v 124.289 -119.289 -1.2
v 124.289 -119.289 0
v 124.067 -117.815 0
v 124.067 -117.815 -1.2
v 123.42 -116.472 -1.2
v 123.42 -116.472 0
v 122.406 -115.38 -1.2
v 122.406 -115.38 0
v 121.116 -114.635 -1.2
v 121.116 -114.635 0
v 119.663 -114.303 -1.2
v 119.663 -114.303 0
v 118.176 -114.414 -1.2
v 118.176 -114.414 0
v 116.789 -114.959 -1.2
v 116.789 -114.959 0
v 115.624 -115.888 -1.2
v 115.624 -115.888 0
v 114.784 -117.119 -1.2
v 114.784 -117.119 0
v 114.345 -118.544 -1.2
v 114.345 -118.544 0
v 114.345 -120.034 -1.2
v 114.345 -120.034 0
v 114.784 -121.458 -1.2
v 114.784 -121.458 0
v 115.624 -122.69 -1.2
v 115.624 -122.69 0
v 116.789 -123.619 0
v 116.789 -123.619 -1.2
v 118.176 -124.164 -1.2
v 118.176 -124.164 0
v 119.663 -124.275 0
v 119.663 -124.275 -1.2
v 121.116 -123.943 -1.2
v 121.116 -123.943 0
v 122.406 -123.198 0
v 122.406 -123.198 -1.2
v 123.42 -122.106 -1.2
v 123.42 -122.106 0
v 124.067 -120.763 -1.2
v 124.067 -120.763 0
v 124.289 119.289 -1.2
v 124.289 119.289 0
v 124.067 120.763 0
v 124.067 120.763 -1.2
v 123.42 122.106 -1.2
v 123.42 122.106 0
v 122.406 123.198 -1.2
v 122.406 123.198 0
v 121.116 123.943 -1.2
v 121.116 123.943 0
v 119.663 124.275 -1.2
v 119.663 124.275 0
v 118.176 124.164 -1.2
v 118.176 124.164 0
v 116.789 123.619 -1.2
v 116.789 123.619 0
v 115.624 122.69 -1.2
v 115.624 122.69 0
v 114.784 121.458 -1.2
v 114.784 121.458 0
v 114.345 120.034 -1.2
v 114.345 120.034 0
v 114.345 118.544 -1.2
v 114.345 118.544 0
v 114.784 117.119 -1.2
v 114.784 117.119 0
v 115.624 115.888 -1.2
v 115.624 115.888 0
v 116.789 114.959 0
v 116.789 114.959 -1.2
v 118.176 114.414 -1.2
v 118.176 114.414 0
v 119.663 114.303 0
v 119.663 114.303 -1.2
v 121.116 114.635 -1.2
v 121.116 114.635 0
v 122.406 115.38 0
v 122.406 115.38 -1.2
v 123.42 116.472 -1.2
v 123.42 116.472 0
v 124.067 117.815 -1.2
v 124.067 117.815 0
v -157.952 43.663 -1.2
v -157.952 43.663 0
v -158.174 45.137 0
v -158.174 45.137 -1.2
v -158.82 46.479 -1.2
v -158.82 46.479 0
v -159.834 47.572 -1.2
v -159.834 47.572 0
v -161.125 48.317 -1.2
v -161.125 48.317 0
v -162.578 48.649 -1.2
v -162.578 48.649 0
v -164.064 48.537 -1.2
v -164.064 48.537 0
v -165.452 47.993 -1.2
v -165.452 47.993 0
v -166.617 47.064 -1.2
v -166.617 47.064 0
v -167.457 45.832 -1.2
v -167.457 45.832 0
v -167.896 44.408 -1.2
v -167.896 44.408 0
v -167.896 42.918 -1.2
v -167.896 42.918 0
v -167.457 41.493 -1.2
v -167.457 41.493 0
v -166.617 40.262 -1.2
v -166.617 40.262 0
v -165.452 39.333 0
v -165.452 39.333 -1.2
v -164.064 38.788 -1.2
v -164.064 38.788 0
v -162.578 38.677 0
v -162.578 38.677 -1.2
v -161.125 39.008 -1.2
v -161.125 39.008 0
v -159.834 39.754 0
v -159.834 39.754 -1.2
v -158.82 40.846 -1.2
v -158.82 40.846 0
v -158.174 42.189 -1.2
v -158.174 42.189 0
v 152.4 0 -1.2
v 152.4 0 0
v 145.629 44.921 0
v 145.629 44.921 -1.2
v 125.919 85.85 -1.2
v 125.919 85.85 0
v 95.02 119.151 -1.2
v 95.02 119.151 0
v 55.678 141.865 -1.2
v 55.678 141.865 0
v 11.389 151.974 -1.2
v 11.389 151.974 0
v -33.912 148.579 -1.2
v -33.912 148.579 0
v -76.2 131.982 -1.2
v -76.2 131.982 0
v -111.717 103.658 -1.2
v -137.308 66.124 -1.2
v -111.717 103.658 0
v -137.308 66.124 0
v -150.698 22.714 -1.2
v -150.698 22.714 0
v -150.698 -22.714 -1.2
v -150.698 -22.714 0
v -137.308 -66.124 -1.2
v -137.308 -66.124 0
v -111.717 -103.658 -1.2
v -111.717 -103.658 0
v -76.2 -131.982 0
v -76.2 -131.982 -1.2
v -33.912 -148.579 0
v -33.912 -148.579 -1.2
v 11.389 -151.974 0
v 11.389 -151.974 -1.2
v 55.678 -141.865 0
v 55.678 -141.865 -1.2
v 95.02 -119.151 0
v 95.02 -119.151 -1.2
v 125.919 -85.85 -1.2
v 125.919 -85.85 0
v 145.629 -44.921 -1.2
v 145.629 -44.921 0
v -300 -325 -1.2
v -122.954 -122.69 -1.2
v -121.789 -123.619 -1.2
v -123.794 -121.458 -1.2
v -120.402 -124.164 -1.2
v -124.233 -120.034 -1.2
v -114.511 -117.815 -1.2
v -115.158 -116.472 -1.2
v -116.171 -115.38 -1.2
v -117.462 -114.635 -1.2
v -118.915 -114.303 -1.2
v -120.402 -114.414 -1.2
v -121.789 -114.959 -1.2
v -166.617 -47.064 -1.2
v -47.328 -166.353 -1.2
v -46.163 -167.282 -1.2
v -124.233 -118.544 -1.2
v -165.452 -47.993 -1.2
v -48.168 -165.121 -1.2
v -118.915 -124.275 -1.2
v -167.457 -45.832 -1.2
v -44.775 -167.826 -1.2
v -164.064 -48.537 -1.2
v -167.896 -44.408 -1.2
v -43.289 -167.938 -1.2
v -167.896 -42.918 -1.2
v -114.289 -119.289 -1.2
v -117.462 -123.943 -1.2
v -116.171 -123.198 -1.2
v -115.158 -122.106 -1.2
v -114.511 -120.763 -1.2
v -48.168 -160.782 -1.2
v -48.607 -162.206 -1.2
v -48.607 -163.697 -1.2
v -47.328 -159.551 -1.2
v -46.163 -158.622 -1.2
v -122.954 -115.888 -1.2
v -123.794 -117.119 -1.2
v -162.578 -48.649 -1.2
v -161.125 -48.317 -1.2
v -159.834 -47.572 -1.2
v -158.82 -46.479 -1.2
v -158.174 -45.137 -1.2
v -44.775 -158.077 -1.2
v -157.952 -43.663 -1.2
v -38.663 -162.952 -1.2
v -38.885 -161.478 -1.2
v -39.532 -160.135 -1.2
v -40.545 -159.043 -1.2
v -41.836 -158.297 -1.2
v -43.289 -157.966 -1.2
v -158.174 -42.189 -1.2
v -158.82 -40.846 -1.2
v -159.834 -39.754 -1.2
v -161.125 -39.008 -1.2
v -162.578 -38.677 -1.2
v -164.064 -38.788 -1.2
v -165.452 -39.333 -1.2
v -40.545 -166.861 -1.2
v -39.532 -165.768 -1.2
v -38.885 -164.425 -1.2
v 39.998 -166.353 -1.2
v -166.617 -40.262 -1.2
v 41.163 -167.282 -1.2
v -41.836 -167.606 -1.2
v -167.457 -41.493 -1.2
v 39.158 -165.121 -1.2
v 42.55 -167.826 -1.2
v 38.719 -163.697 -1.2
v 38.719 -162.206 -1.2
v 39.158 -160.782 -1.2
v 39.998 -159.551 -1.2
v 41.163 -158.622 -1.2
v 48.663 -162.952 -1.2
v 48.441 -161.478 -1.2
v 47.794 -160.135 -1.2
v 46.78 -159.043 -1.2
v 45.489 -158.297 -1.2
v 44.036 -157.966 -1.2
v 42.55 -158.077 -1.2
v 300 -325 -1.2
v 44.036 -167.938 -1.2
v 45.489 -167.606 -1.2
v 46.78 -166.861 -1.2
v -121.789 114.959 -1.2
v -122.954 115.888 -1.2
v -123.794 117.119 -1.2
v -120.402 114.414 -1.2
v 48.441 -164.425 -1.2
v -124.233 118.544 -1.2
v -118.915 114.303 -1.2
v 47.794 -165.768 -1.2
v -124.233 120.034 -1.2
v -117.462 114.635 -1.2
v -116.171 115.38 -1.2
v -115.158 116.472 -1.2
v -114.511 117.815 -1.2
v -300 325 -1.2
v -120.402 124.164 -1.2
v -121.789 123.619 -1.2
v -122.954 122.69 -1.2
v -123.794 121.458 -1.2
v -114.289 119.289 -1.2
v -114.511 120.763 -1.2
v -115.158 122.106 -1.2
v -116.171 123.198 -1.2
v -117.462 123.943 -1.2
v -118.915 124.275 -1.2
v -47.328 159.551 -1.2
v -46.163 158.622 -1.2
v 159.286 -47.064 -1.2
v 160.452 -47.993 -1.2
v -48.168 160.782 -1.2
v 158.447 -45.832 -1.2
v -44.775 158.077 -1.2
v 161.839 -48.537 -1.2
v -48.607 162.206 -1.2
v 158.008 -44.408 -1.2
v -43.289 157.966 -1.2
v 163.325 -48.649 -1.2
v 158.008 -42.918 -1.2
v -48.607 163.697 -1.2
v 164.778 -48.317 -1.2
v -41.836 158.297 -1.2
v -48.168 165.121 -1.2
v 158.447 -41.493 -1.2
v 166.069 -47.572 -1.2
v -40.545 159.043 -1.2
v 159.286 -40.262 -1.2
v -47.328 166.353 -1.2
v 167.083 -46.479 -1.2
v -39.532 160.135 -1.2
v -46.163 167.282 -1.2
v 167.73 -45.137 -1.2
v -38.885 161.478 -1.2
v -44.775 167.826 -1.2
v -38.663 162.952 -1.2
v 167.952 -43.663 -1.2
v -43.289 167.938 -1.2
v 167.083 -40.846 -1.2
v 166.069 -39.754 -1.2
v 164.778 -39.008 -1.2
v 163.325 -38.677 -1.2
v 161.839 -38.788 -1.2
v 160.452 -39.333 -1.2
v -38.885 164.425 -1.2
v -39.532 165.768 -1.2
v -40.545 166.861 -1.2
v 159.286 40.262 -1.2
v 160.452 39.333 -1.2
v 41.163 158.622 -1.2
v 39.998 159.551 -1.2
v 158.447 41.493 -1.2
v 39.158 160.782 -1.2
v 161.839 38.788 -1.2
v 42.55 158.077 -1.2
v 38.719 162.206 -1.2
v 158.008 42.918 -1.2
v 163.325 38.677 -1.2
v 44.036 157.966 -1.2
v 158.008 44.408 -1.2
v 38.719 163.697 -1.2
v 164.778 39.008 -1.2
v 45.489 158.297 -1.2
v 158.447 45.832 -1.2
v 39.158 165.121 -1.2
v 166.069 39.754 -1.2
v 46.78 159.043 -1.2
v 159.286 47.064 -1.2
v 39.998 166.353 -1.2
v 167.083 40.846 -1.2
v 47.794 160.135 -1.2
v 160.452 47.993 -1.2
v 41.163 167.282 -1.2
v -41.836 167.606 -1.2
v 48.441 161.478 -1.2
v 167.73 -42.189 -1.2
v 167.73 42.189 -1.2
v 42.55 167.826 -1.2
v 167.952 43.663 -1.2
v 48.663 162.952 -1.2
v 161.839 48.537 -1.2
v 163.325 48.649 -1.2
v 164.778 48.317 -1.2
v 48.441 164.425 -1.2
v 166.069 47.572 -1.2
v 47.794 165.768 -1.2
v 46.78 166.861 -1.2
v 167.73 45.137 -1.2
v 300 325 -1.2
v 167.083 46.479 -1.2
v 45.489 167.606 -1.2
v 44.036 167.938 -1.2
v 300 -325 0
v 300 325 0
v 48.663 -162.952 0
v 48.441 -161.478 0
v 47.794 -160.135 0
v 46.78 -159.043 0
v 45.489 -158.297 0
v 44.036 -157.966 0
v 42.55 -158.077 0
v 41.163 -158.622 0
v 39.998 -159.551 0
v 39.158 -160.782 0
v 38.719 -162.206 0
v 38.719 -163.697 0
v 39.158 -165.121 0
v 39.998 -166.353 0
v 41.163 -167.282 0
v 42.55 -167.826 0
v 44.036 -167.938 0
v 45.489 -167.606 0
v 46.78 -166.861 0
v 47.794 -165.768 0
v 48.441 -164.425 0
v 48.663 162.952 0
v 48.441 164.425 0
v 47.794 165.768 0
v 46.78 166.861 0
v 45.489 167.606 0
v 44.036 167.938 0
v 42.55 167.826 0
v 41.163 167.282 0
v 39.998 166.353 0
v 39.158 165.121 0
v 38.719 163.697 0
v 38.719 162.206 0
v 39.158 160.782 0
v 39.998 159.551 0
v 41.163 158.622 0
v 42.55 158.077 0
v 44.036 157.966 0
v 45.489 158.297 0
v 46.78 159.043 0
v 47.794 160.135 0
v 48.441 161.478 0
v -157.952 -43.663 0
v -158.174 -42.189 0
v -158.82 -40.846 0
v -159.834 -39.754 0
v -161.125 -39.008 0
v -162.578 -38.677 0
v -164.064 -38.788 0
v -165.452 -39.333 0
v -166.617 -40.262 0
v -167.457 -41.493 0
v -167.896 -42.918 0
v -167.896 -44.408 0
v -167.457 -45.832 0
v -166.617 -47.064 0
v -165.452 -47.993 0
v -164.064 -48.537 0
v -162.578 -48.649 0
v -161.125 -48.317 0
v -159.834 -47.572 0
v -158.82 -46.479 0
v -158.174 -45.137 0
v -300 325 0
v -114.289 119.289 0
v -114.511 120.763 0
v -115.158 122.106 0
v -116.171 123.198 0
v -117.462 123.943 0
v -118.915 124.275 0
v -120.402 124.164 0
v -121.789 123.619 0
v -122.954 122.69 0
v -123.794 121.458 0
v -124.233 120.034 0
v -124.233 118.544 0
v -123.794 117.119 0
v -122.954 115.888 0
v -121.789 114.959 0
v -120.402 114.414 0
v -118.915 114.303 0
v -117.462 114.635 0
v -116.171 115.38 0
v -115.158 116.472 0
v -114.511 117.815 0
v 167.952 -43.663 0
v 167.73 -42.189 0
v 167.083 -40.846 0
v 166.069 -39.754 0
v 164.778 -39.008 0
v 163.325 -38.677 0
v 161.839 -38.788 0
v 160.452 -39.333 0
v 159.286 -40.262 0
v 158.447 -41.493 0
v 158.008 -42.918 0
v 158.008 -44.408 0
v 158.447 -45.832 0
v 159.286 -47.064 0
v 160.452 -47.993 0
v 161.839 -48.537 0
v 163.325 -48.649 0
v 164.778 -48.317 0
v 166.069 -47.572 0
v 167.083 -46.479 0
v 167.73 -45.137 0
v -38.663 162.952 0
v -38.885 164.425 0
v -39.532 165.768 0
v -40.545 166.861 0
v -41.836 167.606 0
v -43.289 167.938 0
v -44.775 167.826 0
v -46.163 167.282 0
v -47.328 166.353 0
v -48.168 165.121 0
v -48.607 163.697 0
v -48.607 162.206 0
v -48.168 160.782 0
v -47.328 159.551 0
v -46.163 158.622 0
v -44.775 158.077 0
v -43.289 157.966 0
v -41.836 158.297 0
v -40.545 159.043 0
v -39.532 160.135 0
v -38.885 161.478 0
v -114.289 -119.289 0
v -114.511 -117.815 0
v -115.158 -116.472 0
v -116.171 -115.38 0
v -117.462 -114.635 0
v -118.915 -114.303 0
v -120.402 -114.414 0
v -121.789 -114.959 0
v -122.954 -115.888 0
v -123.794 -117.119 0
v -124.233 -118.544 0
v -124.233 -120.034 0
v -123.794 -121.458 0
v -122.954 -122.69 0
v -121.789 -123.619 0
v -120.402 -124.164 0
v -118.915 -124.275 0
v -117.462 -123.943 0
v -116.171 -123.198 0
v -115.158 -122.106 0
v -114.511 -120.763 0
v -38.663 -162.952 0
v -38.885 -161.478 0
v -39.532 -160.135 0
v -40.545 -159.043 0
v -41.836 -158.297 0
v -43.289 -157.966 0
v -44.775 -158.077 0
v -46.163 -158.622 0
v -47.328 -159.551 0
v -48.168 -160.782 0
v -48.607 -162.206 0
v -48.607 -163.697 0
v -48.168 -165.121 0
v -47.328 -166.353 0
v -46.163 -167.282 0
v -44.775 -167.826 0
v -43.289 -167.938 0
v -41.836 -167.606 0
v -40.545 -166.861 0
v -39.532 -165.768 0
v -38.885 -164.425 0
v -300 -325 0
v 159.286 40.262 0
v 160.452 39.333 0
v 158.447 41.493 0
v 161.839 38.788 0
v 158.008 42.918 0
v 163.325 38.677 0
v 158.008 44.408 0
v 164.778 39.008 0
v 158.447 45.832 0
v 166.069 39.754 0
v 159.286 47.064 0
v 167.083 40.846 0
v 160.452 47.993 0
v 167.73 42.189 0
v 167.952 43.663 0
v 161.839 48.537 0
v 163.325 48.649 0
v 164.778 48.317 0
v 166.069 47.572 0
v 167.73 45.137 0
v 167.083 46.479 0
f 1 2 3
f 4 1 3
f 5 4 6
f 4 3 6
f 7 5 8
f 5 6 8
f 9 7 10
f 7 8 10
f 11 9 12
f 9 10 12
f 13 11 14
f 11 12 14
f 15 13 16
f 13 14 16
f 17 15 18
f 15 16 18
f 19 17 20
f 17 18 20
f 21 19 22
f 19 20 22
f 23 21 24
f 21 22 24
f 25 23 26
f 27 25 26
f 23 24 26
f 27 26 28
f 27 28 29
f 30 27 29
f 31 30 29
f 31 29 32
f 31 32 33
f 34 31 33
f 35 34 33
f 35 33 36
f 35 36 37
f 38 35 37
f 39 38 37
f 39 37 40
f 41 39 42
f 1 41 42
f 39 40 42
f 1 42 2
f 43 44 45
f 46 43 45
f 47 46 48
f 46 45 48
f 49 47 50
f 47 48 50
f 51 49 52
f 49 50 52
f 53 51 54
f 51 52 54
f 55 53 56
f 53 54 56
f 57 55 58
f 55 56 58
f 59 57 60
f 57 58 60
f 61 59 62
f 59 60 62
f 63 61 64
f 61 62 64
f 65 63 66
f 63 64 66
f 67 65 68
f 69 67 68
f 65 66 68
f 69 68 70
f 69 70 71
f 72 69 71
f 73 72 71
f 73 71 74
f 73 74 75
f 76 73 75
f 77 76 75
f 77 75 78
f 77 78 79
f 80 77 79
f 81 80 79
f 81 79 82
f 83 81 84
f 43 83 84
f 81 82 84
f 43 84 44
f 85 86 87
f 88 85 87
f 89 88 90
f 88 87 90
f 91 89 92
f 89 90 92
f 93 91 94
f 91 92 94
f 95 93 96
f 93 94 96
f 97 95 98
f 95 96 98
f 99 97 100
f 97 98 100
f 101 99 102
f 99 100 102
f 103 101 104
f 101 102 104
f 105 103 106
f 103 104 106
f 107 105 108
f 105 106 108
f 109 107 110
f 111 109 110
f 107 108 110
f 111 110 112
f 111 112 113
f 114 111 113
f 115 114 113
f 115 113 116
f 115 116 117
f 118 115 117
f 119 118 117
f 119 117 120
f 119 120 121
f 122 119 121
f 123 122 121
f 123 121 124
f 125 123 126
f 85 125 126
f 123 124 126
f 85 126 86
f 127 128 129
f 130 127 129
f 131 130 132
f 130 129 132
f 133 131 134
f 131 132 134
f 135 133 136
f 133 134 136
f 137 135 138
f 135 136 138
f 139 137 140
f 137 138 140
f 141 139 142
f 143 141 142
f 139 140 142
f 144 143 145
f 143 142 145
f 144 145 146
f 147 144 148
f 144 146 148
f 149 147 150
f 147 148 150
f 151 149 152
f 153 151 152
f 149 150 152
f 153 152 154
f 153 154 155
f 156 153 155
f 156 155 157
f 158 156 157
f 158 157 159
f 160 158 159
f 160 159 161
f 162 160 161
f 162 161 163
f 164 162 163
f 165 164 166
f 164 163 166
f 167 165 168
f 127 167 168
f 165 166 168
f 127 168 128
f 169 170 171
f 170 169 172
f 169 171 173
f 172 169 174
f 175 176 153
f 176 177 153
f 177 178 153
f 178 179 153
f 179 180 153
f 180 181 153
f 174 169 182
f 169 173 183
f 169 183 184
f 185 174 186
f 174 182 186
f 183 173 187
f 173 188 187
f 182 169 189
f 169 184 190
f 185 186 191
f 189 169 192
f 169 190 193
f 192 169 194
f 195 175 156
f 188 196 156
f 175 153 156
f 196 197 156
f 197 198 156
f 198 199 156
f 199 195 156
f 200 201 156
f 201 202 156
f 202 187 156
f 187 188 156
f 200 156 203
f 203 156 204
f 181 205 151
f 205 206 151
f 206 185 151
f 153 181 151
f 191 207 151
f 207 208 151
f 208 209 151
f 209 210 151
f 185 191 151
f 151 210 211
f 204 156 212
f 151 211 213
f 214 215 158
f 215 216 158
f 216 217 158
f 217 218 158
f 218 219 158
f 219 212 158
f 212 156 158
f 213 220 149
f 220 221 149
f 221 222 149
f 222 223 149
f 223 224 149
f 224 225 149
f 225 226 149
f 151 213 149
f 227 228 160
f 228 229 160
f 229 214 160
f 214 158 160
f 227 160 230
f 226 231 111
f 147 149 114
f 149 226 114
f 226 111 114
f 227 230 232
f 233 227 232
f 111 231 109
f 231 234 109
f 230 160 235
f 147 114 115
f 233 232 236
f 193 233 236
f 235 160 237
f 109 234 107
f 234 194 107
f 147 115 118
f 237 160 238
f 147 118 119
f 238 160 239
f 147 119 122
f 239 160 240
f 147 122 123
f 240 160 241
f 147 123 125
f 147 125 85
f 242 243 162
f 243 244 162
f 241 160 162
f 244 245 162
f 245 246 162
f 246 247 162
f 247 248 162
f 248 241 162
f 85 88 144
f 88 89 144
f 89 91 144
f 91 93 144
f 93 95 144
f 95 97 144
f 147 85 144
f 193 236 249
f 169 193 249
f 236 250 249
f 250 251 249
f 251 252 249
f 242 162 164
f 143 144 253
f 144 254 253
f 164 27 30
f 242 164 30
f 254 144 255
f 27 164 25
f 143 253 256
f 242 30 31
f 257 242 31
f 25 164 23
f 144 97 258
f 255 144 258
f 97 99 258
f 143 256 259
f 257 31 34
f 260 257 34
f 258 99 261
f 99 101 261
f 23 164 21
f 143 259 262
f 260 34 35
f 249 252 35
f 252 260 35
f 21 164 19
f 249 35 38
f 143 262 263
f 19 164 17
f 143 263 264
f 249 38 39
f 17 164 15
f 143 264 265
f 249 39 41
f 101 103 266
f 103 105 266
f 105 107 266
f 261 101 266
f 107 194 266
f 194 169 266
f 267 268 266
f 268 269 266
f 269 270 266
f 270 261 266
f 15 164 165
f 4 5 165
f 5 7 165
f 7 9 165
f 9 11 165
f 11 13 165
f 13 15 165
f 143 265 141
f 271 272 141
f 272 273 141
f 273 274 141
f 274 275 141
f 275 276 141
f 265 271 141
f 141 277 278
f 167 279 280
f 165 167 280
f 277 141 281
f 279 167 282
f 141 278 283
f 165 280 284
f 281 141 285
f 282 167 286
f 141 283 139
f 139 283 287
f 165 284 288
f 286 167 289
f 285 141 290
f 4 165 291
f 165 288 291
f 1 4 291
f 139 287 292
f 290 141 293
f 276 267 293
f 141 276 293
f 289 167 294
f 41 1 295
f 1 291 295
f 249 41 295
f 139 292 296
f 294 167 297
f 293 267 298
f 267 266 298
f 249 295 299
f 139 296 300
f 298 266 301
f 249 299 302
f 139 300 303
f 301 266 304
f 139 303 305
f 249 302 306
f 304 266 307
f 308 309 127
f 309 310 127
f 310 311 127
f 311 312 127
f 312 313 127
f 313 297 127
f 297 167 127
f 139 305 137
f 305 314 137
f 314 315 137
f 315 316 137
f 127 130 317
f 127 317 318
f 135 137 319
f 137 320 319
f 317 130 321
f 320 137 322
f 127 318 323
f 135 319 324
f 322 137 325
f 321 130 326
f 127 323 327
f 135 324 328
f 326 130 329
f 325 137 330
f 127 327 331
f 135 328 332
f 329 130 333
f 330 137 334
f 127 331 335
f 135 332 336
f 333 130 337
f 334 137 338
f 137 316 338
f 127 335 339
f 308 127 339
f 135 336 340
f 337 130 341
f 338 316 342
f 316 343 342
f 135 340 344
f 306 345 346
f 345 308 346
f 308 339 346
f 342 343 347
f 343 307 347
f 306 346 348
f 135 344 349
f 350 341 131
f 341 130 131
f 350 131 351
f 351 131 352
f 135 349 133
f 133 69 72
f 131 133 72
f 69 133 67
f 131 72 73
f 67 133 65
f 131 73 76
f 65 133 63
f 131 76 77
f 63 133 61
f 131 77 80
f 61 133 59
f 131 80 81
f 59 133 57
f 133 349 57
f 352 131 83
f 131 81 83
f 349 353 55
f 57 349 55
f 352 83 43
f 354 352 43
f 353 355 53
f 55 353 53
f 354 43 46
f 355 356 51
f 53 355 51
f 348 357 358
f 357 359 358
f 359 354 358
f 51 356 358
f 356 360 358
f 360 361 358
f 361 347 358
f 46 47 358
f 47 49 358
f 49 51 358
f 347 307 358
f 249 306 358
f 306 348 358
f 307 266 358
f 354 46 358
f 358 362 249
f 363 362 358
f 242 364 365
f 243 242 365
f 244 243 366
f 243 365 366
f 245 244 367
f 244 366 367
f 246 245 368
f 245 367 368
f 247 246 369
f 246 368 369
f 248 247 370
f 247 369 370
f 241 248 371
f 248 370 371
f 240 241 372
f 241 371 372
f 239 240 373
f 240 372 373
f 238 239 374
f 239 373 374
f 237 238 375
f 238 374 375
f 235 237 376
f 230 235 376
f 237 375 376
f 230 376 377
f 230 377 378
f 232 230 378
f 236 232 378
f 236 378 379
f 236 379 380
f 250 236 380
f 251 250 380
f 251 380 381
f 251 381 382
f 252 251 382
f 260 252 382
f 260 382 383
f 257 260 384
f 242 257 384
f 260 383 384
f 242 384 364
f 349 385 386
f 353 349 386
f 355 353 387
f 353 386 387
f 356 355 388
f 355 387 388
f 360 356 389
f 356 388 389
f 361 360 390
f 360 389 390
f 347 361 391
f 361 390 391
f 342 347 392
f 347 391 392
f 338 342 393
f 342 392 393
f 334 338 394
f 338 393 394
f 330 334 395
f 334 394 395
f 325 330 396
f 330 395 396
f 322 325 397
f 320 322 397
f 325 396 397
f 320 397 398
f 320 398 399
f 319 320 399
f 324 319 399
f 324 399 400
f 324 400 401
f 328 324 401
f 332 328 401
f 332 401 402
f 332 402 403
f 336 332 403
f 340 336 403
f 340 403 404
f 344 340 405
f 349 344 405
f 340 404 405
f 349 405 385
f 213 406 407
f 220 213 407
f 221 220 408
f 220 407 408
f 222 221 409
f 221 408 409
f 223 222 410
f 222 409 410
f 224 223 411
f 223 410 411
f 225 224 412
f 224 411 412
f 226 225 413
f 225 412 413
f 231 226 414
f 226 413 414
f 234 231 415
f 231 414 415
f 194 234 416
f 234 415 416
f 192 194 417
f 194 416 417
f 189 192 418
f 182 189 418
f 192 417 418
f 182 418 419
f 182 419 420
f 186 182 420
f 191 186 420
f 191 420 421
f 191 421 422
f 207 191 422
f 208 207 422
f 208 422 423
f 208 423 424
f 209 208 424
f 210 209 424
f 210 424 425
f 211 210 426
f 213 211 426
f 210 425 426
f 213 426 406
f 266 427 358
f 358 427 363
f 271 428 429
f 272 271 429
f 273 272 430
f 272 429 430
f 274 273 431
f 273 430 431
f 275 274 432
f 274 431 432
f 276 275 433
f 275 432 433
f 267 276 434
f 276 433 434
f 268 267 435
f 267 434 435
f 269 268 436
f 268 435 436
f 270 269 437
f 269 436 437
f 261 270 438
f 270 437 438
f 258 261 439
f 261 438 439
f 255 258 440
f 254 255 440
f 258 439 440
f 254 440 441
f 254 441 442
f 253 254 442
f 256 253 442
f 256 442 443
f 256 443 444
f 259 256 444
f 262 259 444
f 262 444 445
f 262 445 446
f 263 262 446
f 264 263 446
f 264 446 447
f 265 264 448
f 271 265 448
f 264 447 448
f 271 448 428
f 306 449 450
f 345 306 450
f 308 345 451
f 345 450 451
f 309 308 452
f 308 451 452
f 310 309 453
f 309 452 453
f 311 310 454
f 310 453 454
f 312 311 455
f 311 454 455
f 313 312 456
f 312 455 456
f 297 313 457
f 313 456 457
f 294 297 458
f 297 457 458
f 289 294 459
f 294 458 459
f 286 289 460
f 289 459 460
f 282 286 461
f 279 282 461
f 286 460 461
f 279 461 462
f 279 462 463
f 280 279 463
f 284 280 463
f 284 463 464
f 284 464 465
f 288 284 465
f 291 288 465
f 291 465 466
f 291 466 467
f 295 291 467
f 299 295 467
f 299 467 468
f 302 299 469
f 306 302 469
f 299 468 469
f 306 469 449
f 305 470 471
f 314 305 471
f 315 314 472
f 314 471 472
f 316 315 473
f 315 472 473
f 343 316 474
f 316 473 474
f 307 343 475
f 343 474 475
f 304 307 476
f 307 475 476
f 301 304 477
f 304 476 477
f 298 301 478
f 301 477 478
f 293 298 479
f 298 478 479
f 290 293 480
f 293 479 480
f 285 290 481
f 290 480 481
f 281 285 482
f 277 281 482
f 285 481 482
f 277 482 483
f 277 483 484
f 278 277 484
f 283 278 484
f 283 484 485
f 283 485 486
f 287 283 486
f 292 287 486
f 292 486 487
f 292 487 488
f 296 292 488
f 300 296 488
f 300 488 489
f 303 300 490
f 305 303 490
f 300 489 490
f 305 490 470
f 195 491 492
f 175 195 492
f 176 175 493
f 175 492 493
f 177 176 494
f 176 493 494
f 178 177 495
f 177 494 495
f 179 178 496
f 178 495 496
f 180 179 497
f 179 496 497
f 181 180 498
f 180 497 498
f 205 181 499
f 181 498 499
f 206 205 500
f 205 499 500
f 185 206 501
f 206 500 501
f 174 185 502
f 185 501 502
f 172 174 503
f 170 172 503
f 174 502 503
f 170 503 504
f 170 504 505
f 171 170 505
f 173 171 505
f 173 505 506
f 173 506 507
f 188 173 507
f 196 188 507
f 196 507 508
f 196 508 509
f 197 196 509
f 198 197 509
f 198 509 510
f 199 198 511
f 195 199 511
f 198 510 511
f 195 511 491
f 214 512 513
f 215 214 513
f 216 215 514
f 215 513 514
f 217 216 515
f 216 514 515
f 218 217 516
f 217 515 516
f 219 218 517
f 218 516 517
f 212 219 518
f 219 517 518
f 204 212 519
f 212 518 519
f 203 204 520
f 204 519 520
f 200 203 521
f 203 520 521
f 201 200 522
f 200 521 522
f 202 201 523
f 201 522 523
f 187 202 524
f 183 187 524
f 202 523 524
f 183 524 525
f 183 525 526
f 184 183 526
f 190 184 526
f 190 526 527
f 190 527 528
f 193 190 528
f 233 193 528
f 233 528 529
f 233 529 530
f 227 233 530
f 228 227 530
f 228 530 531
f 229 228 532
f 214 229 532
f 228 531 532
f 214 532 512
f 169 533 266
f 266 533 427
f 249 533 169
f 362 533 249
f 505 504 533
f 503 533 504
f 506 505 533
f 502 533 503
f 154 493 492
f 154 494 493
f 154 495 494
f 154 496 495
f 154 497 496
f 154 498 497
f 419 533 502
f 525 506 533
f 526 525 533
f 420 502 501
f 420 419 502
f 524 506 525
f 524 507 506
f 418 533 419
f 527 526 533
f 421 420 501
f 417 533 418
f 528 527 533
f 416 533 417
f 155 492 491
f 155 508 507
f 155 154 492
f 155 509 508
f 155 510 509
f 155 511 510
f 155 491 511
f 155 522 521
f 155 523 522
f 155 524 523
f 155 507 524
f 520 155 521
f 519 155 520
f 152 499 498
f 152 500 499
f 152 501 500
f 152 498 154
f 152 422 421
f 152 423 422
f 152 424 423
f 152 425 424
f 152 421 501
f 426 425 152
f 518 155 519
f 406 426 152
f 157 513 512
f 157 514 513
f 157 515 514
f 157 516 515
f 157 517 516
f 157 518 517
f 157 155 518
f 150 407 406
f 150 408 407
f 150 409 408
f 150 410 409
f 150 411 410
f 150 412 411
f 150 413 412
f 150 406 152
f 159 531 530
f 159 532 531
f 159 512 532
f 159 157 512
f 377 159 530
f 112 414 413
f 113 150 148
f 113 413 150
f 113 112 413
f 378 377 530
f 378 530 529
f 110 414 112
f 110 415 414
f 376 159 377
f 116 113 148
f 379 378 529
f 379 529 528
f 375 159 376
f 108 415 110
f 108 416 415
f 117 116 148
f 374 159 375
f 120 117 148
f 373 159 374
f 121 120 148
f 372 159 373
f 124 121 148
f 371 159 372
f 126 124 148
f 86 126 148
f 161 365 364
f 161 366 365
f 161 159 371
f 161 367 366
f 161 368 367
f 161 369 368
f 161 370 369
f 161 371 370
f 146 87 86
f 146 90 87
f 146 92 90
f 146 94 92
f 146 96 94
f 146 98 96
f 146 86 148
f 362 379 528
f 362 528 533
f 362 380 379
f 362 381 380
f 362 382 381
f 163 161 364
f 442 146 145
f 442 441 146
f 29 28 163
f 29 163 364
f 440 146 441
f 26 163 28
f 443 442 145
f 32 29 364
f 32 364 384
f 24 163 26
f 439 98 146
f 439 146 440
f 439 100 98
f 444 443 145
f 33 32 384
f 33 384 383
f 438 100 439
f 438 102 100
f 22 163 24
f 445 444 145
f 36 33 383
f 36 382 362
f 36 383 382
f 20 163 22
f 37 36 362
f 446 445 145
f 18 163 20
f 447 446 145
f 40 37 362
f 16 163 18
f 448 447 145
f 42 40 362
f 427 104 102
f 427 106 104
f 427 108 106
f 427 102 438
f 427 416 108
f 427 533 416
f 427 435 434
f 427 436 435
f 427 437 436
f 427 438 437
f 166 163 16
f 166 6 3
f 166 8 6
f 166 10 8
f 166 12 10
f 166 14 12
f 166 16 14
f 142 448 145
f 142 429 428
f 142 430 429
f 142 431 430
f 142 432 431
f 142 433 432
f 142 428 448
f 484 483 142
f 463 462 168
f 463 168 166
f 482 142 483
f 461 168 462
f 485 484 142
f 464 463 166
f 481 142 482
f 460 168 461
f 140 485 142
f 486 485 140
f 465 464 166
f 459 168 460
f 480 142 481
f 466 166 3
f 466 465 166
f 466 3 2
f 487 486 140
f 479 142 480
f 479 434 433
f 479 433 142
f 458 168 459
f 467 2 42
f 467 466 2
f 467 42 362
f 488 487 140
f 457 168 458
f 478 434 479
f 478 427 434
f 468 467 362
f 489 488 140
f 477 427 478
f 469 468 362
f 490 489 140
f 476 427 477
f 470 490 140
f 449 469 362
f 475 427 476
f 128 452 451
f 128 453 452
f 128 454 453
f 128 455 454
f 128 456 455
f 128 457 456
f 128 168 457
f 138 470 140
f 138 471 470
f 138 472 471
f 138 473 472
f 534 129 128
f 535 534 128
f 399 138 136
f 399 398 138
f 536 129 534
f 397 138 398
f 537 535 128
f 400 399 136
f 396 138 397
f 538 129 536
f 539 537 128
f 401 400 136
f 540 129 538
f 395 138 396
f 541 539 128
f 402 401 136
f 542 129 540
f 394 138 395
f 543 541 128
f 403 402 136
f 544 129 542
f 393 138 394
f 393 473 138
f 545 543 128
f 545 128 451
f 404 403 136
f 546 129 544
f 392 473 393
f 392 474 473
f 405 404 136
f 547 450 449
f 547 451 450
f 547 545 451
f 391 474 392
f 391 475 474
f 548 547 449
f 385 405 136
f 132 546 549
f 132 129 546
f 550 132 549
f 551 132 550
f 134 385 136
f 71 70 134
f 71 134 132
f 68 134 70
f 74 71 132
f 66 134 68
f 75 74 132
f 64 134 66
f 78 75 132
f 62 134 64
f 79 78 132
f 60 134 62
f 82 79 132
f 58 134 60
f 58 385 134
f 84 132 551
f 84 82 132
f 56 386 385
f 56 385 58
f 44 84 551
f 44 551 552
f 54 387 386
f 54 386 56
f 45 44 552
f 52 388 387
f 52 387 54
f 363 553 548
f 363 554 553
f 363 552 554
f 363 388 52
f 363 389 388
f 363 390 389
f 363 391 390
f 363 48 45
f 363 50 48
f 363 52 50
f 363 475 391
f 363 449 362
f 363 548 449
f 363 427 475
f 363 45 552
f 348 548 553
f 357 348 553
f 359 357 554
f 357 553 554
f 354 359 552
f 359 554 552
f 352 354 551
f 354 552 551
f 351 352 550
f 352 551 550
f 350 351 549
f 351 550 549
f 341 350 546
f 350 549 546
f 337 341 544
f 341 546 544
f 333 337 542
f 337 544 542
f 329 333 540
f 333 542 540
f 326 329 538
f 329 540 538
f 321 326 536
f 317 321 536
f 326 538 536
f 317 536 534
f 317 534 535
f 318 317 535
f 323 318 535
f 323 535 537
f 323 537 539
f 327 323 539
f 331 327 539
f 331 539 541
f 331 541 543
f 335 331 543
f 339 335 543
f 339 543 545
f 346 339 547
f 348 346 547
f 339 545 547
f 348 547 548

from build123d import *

# Parameters (mm, degrees)
SKETCH1_W          = 600
SKETCH1_H          = 650
SKETCH1_R          = 152.4
SKETCH1_R_2        = 5
BASE_FLANGE1_DEPTH = 1.2


# Sheet-metal steps are written as plain solids
with BuildPart() as part:
    # Sketch1 → Base-Flange1 (new body)
    with BuildSketch(Plane.XY):
        Rectangle(SKETCH1_W, SKETCH1_H)
        Circle(SKETCH1_R, mode=Mode.SUBTRACT)
        with Locations((43.662772909, 162.951686895)):
            Circle(SKETCH1_R_2, mode=Mode.SUBTRACT)
        with Locations((119.288913986, 119.288913986)):
            Circle(SKETCH1_R_2, mode=Mode.SUBTRACT)
        with Locations((162.951686895, 43.662772909)):
            Circle(SKETCH1_R_2, mode=Mode.SUBTRACT)
        with Locations((162.951686895, -43.662772909)):
            Circle(SKETCH1_R_2, mode=Mode.SUBTRACT)
        with Locations((119.288913986, -119.288913986)):
            Circle(SKETCH1_R_2, mode=Mode.SUBTRACT)
        with Locations((43.662772909, -162.951686895)):
            Circle(SKETCH1_R_2, mode=Mode.SUBTRACT)
        with Locations((-43.662772909, -162.951686895)):
            Circle(SKETCH1_R_2, mode=Mode.SUBTRACT)
        with Locations((-119.288913986, -119.288913986)):
            Circle(SKETCH1_R_2, mode=Mode.SUBTRACT)
        with Locations((-162.951686895, -43.662772909)):
            Circle(SKETCH1_R_2, mode=Mode.SUBTRACT)
        with Locations((-162.951686895, 43.662772909)):
            Circle(SKETCH1_R_2, mode=Mode.SUBTRACT)
        with Locations((-119.288913986, 119.288913986)):
            Circle(SKETCH1_R_2, mode=Mode.SUBTRACT)
        with Locations((-43.662772909, 162.951686895)):
            Circle(SKETCH1_R_2, mode=Mode.SUBTRACT)
    extrude(amount=-BASE_FLANGE1_DEPTH)


solid = part.part
